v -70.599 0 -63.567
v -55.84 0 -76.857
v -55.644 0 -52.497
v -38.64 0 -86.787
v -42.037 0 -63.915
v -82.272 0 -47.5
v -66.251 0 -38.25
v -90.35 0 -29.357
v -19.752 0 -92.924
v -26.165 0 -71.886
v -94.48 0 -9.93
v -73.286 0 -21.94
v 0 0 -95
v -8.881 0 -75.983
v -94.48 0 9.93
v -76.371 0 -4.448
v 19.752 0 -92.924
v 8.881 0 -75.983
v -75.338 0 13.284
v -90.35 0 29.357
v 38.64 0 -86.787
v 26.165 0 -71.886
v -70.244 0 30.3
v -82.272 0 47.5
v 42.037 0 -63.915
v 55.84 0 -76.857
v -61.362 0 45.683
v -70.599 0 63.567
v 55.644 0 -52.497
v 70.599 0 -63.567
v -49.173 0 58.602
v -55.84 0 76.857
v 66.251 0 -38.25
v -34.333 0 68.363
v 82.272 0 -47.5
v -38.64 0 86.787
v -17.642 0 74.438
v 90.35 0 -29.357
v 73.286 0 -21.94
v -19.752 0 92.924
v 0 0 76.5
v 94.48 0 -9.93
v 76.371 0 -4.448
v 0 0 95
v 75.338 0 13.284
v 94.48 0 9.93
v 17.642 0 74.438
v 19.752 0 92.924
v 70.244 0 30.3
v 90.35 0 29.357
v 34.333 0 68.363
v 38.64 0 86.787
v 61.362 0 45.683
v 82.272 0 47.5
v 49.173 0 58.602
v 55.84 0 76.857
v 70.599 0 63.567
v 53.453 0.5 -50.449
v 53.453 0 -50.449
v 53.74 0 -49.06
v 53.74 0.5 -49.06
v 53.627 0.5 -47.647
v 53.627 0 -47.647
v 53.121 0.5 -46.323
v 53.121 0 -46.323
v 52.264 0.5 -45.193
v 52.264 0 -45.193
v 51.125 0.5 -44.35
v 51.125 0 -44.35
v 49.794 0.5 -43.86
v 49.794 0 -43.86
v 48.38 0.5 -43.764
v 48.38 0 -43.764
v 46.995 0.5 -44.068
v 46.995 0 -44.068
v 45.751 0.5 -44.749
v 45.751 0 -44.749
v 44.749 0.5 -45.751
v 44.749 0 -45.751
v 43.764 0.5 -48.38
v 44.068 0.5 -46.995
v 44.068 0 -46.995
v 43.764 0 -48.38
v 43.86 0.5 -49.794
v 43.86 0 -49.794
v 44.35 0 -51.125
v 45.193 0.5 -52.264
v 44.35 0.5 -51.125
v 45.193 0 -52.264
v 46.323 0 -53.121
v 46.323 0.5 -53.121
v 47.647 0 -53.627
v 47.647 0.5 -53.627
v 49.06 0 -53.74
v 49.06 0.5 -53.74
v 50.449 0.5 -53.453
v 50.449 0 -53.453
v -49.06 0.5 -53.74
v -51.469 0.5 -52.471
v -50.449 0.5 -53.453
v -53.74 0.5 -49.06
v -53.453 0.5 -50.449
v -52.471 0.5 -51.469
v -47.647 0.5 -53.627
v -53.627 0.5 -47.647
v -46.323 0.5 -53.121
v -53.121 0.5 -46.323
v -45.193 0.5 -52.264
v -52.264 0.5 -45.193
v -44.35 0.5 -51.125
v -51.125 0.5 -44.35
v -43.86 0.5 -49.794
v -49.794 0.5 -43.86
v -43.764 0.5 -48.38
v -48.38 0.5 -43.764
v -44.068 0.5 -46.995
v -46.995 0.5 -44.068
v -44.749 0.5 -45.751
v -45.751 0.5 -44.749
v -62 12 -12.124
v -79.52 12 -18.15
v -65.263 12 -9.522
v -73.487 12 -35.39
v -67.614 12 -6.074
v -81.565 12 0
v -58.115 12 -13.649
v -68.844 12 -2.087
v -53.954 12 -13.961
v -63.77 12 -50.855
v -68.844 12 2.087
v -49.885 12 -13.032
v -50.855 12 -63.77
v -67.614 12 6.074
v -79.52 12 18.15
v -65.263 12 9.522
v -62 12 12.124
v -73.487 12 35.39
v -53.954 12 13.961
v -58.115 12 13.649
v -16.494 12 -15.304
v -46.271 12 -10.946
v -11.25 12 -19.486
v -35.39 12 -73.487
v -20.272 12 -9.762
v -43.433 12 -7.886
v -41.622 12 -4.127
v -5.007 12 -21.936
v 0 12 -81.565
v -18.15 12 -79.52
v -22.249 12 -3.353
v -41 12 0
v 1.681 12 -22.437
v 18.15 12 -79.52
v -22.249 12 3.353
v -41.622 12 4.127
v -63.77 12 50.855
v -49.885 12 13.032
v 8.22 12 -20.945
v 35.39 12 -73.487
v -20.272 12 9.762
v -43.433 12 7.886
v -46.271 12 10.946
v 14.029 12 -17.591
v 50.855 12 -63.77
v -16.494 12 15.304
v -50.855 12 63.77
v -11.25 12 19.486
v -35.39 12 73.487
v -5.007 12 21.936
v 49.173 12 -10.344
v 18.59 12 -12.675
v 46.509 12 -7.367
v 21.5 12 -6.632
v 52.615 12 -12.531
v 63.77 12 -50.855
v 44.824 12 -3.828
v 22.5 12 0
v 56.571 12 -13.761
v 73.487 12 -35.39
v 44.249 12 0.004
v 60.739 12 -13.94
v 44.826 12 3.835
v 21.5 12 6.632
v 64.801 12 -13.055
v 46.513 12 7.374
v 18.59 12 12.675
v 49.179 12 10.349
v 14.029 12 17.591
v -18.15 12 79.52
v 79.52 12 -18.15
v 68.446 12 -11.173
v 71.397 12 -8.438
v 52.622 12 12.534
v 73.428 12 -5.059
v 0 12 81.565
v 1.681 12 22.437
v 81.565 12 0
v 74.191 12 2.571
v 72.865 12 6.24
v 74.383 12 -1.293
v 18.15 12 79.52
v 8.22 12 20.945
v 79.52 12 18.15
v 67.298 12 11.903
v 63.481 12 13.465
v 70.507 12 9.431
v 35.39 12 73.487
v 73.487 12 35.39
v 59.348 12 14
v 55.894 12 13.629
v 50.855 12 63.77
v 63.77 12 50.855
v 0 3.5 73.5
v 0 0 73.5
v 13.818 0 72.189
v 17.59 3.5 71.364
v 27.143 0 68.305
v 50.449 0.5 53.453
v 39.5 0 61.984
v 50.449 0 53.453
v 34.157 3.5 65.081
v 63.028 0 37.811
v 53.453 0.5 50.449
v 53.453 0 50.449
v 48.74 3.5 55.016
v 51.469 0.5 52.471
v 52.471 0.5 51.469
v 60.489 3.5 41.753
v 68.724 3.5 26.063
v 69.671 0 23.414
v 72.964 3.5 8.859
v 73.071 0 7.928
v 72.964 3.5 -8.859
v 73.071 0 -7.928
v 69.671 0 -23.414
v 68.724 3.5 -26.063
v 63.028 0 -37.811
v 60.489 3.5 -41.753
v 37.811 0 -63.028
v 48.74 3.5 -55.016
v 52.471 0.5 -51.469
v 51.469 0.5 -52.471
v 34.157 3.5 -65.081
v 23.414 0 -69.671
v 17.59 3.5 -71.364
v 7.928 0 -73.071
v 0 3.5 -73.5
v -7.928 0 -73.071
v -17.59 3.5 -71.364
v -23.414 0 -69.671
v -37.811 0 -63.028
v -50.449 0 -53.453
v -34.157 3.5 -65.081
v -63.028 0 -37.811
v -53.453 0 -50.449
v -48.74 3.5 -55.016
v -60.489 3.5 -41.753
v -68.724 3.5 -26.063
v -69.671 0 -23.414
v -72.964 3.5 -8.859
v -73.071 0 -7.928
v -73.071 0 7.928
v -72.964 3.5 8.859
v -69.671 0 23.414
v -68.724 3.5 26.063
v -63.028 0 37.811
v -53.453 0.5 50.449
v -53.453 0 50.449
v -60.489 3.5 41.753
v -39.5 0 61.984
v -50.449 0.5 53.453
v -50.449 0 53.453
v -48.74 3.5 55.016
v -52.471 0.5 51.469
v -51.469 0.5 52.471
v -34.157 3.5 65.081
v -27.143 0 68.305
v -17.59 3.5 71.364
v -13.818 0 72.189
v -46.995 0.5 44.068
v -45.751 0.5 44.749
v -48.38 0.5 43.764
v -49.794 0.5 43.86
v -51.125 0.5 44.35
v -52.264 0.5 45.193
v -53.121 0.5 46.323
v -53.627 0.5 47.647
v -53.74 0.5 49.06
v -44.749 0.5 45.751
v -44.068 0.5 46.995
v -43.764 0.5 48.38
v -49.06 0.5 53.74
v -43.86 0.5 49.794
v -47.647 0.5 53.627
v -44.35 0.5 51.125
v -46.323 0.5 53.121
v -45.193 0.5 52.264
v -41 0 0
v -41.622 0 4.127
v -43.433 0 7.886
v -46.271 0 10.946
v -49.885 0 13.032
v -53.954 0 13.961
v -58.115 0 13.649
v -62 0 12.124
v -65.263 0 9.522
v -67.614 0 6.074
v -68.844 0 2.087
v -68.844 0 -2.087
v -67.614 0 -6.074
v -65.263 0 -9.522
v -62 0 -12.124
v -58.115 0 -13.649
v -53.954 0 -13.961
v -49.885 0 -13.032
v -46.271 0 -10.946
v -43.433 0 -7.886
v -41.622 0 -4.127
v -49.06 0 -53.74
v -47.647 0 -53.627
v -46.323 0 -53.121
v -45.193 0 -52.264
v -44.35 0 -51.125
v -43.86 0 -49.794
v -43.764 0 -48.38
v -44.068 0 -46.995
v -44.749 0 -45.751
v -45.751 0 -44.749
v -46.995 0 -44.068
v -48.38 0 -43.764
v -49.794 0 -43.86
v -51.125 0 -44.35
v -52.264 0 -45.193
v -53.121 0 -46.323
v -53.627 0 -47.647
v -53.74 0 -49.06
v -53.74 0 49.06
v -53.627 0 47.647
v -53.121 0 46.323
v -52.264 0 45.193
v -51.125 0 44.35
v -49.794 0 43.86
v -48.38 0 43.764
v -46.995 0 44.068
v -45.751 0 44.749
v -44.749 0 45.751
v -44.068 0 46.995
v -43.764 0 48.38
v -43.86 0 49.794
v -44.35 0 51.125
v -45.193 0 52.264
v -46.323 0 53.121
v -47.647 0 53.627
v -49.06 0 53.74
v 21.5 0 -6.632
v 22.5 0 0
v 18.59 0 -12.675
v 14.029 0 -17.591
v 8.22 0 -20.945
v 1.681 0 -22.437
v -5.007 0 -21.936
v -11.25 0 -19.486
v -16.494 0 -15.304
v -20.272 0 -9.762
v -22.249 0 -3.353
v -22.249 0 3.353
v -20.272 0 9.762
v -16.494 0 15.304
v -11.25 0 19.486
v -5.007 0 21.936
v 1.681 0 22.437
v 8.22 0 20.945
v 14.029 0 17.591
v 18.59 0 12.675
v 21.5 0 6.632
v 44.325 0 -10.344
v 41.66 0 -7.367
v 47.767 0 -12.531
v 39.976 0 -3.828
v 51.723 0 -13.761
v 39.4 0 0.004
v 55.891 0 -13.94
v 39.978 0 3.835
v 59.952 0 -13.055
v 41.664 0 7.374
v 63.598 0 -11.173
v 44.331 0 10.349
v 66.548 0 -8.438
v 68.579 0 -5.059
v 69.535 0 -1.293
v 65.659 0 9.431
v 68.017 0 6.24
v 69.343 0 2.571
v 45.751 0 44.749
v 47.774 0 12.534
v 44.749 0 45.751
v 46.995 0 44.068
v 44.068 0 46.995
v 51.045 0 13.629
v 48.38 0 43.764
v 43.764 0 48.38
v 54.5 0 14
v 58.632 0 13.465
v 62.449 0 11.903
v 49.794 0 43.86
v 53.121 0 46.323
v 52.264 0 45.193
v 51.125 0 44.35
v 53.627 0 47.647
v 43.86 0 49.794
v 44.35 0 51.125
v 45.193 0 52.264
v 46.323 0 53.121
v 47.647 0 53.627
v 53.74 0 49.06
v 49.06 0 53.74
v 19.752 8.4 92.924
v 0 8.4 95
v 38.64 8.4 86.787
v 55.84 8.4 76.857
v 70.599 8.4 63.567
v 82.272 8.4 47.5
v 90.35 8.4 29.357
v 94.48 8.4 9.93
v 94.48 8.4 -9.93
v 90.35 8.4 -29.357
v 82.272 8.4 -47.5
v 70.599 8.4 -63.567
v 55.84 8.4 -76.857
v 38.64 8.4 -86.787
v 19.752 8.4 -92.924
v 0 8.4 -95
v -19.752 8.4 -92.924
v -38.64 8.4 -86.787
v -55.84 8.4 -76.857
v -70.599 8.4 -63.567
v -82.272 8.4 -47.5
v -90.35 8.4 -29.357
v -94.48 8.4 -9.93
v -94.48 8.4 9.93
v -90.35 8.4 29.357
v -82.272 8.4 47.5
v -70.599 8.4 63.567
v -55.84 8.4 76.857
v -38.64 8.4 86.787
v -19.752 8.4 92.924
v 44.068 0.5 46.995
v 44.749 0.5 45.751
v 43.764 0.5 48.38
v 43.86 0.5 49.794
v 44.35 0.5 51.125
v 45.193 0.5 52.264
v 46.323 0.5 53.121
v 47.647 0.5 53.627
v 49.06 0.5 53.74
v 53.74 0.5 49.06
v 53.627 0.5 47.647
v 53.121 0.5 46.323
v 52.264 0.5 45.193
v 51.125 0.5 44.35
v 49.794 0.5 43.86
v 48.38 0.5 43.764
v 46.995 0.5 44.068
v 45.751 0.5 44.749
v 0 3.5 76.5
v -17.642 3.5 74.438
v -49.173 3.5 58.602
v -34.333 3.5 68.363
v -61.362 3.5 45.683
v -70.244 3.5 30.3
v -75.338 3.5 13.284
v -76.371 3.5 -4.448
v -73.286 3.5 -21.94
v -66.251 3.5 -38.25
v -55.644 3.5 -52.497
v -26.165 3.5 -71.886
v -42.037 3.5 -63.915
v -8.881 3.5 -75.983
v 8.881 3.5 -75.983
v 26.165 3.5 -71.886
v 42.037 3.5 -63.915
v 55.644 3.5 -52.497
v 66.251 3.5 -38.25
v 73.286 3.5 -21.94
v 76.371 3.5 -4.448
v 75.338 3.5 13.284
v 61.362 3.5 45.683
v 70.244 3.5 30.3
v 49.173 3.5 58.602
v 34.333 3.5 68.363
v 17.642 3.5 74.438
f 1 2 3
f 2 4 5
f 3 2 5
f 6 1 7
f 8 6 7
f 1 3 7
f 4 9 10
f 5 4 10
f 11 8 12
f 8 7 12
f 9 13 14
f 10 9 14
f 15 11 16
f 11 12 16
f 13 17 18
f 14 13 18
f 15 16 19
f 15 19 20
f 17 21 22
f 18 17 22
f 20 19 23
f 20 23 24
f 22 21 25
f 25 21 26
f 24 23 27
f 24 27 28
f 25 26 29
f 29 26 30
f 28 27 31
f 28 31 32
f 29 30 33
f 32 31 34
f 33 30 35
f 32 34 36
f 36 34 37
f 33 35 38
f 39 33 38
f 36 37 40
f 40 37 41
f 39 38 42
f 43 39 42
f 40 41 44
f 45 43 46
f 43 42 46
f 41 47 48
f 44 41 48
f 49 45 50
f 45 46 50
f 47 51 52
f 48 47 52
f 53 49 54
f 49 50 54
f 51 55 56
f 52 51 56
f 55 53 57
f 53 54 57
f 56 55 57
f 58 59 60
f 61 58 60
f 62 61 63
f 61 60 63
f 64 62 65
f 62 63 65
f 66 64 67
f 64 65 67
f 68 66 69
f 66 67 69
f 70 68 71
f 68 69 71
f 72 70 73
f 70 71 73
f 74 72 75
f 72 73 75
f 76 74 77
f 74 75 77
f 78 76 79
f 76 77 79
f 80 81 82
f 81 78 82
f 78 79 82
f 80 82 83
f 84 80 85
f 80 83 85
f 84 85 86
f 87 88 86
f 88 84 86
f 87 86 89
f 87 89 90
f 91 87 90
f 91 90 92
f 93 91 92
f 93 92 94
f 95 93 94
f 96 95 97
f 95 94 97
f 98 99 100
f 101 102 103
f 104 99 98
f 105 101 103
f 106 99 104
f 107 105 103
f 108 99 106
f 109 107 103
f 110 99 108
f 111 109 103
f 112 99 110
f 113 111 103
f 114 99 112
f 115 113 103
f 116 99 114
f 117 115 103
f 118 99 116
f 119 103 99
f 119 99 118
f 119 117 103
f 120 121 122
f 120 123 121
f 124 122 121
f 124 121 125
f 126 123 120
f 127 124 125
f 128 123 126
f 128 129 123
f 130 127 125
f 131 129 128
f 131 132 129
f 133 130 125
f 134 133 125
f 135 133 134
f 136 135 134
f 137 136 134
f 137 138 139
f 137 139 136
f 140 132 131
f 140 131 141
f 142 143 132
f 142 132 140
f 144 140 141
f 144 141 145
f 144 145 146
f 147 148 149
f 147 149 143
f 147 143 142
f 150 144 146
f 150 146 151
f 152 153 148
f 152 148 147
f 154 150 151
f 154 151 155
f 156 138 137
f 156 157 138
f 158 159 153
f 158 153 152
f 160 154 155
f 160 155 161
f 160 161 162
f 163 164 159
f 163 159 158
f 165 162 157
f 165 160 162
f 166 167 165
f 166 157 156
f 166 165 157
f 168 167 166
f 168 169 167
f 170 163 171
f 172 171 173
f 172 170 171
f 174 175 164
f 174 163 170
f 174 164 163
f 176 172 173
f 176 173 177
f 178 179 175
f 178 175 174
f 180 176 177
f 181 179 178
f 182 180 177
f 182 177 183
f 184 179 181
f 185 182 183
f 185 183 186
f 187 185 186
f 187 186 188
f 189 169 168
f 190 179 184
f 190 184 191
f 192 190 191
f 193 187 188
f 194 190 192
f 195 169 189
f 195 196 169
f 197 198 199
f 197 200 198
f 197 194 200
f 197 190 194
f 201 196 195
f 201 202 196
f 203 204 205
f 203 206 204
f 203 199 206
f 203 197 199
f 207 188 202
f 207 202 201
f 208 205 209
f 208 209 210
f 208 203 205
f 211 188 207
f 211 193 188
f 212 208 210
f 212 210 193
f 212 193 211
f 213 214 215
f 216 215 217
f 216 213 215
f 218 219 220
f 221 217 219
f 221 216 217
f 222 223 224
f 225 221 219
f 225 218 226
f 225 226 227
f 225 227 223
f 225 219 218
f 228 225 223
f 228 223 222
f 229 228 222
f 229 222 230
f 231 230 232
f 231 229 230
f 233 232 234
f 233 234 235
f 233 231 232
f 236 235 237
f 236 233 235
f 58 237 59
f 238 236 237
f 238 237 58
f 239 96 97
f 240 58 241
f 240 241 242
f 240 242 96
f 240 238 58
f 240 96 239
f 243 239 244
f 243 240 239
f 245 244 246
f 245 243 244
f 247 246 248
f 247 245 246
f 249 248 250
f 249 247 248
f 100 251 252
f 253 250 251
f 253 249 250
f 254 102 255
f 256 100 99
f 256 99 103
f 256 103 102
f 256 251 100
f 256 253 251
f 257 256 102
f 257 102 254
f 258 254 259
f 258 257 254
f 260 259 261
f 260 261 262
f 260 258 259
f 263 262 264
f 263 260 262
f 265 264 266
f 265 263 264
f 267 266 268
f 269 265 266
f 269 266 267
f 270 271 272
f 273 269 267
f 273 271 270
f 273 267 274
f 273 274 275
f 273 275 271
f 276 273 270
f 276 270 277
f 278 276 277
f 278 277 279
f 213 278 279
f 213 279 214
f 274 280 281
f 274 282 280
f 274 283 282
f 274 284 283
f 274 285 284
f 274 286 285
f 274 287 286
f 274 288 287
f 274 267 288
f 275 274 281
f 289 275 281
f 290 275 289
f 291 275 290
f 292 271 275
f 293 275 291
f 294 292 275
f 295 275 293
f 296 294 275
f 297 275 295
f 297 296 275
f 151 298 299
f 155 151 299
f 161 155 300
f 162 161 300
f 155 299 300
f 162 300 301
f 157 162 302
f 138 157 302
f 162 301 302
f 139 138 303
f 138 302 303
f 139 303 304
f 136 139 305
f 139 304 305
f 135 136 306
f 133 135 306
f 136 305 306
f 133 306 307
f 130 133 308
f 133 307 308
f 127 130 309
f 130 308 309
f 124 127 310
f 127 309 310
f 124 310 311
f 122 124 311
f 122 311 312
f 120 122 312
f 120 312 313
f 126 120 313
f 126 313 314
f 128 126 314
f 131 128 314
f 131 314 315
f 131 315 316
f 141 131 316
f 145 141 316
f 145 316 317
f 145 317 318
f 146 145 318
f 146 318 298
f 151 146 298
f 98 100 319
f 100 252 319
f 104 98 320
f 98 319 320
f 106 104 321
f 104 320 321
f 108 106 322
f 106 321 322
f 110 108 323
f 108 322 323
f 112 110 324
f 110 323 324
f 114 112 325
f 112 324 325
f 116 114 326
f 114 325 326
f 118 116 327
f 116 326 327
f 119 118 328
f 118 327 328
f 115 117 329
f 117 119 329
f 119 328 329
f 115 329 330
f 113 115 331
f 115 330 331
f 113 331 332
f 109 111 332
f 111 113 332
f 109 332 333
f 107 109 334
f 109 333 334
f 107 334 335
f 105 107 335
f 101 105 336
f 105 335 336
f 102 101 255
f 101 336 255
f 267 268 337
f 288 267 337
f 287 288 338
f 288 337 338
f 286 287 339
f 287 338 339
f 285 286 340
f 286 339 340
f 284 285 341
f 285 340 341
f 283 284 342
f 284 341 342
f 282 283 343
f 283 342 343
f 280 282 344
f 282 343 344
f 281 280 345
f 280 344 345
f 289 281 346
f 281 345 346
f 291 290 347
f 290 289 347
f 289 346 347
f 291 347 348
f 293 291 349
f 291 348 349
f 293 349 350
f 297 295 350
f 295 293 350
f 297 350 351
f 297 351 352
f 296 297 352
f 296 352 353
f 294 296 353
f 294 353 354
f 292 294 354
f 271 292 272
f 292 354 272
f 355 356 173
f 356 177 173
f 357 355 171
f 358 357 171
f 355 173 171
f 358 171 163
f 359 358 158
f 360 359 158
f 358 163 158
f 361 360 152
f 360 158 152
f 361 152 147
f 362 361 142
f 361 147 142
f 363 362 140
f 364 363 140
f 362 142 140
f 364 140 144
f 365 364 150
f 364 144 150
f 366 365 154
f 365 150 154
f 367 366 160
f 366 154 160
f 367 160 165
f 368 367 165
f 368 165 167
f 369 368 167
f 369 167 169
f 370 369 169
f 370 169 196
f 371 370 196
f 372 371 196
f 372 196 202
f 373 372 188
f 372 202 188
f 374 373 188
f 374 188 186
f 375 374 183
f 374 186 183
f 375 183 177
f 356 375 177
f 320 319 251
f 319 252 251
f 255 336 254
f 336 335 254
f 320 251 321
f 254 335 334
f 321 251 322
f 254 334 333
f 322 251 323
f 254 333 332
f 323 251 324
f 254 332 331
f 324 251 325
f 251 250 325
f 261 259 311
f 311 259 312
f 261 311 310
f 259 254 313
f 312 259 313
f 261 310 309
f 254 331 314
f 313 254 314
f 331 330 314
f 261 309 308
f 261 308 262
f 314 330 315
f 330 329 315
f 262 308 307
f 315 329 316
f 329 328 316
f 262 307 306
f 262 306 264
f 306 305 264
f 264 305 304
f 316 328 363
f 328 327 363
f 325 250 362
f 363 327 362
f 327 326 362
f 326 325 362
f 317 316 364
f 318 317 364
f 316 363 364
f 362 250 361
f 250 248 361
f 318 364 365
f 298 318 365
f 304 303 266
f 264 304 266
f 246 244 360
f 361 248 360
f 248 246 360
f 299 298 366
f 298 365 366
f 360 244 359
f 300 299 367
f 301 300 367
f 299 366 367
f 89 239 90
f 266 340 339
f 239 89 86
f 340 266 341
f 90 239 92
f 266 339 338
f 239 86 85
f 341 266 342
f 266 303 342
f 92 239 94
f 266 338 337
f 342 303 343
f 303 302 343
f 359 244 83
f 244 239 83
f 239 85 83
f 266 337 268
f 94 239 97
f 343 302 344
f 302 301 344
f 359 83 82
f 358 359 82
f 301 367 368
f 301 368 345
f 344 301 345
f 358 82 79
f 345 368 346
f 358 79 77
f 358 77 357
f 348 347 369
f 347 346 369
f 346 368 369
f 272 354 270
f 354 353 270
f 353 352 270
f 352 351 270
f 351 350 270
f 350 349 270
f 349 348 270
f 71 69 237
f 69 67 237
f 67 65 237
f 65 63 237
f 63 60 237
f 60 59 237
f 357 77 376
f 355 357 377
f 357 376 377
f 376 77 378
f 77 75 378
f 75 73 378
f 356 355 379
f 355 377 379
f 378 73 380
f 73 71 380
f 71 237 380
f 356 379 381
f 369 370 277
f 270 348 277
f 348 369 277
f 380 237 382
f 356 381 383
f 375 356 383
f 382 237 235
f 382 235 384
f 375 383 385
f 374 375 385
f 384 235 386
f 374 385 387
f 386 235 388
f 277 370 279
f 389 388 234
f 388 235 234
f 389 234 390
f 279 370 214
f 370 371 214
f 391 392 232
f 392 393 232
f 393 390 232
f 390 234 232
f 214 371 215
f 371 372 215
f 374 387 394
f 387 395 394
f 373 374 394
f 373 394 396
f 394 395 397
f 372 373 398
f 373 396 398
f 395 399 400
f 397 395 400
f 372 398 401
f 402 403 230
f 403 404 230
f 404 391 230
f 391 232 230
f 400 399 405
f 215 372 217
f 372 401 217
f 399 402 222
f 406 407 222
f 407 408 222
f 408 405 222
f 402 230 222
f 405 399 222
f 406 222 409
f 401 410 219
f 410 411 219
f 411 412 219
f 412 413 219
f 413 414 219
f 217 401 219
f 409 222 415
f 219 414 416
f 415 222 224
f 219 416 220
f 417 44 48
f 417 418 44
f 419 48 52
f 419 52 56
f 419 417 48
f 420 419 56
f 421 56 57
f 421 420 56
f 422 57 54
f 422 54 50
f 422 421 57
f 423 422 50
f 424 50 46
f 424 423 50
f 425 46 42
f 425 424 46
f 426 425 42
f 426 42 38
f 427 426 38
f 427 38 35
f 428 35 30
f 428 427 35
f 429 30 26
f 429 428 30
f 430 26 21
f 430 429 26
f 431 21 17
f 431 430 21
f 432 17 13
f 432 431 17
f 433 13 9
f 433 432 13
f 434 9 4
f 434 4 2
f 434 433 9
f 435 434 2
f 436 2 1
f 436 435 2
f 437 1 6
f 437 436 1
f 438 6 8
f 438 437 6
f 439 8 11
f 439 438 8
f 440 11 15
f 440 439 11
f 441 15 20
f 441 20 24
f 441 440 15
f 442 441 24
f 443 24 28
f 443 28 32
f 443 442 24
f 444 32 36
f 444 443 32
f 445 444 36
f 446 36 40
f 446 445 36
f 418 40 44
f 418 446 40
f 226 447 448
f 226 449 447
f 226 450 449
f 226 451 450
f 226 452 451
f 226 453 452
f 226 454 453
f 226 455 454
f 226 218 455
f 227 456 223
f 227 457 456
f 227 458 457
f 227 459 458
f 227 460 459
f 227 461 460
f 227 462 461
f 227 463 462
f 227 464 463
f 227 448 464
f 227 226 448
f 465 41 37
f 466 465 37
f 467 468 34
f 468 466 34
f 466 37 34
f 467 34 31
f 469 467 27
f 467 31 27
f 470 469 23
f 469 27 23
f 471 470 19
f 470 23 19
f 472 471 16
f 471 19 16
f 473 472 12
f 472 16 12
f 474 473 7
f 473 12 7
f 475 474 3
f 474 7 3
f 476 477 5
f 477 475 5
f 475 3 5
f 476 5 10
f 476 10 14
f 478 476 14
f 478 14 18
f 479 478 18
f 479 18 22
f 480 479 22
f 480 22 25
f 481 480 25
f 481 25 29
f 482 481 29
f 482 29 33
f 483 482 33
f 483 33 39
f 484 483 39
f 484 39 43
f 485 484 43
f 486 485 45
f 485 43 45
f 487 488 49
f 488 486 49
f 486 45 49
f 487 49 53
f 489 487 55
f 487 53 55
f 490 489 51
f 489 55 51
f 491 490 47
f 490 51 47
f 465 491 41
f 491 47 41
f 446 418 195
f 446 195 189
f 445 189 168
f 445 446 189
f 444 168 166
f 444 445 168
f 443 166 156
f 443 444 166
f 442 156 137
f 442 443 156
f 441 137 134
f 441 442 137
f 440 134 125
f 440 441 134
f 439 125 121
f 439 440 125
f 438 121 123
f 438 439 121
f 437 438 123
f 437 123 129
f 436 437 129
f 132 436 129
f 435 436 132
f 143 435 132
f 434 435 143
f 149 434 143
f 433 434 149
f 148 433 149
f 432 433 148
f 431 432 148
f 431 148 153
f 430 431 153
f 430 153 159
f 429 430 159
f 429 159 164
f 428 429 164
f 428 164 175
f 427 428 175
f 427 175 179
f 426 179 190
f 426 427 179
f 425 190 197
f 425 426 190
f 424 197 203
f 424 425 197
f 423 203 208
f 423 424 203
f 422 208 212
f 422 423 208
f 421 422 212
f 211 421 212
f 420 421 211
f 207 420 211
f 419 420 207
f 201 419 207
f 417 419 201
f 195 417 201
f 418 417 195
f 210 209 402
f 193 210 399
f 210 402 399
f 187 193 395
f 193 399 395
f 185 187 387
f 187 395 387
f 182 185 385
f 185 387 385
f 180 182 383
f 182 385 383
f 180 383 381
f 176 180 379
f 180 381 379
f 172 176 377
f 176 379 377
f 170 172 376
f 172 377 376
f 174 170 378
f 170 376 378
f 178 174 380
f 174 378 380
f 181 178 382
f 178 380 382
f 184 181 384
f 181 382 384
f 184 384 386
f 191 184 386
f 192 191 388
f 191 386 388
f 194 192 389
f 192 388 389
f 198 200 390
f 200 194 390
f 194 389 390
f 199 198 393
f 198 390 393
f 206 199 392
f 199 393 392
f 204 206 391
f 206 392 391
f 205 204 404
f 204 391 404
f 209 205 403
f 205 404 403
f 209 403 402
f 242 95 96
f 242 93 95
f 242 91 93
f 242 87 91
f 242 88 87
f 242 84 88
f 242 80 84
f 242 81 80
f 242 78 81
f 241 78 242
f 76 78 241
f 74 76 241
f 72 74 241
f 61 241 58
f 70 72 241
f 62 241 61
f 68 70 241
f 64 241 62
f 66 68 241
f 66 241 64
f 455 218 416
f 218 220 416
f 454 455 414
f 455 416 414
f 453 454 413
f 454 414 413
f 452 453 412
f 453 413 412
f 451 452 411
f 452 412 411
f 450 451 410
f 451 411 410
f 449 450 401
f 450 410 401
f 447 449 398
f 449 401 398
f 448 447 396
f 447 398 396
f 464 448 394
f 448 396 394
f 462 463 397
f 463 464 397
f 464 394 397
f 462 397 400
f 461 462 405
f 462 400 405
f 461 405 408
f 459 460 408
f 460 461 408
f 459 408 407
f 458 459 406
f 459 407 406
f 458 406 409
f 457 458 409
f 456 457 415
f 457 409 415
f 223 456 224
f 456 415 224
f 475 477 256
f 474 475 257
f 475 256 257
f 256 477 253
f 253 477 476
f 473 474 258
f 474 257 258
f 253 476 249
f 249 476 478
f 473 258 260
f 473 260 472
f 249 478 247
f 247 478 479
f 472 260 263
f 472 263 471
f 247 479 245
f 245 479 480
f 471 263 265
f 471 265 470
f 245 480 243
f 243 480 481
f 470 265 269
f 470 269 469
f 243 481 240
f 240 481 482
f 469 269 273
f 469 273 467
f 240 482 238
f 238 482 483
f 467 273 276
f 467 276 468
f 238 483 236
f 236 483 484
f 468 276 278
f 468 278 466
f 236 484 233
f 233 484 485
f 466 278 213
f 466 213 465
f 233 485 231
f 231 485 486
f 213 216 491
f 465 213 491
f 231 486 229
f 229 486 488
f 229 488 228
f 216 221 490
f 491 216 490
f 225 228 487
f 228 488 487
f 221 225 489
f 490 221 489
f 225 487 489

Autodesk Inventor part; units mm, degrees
ref_plane "XZ Plane" through (0, 0, 0) normal (0, 1, 0) x (-1, 0, 0)
ref_plane "XY Plane" through (0, 0, 0) normal (0, 0, 1) x (1, 0, 0)
sketch "Sketch1" plane through (0, 0, 0) normal (1, 0, 0) x (0, 1, 0)
  line L0 (0, 95) -> (8.4, 95)
  line L1 (8.4, 95) -> (12, 81.5646)
  line L2 (12, 81.5646) -> (12, 0)
  line L3 (12, 0) -> (0, 0)
  line L4 (0, 0) -> (0, 73.5)
  line L5 (0, 73.5) -> (3.5, 73.5)
  line L6 (3.5, 73.5) -> (3.5, 76.5)
  line L7 (3.5, 76.5) -> (0, 76.5)
  line L8 (0, 76.5) -> (0, 95)
  line L9 (0, 114) -> (0, -19) construction
  line L10 (-2.4, 0) -> (14.4, 0) projected
  dimension "d0" = 95
  dimension "d1" = 12
  dimension "d2" = 8.4
  dimension "d3" = 3.5
  dimension "d4" = 3
  dimension "d5" = 73.5
  dimension "d6" = 165
revolve "Revolution1" add sketch "Sketch1" angle 360 about axis through (0, -10, 0) along (0, 1, 0)
sketch "Sketch2" plane through (0, 12, 0) normal (0, 1, 0) x (1, 0, 0)
  circle A0 centre (0, 0) radius 22.5
  circle A1 centre (54.5, 0) radius 2.5
  dimension "d8" = 45
  dimension "d12" = 5
  dimension "d13" = 54.5
extrude "Extrusion1" cut sketch "Sketch2" against normal through all
ref_plane "Work Plane1" through (0, 0, 0) normal (0.3746, 0.9272, 0) x (0, 0, 1)
sketch "Sketch3" plane through (0, 0, 0) normal (0.3746, 0.9272, 0) x (0, 0, 1)
  ellipse E0 centre (0, 50.5315) end of major axis (-2.5, 50.5315) minor radius 2.318 projected
  circle A0 centre (0, 50.5315) radius 14
  point P0 (0, 0)
  dimension "d14" = 28
extrude "Extrusion2" cut sketch "Sketch3" along normal blind 73 contours E0 | A0
sketch "Sketch4" plane through (0, 0, 0) normal (0, -1, 0) x (1, 0, 0)
  line L0 (-48.75, -48.75) -> (-48.75, 48.75) construction
  line L1 (-48.75, 48.75) -> (48.75, 48.75) construction
  line L2 (48.75, 48.75) -> (48.75, -48.75) construction
  line L3 (48.75, -48.75) -> (-48.75, -48.75) construction
  line L4 (0, 133) -> (0, -133) construction
  circle A0 centre (48.75, 48.75) radius 5
  circle A1 centre (-48.75, 48.75) radius 5
  circle A2 centre (-48.75, -48.75) radius 5
  circle A3 centre (48.75, -48.75) radius 5
  point P0 (0, 0)
  point P1 (0, 0)
  dimension "d17" = 97.5
  dimension "d18" = 10
extrude "Extrusion3" cut sketch "Sketch4" against normal blind 0.5
sketch "Sketch5" plane through (0, 0, 0) normal (0, -1, 0) x (1, 0, 0)
  circle A0 centre (-55, 0) radius 14
  point P0 (0, 0)
  dimension "d21" = 28
  dimension "d22" = 55
extrude "Extrusion4" cut sketch "Sketch5" against normal through all
properties part number "KF160"
